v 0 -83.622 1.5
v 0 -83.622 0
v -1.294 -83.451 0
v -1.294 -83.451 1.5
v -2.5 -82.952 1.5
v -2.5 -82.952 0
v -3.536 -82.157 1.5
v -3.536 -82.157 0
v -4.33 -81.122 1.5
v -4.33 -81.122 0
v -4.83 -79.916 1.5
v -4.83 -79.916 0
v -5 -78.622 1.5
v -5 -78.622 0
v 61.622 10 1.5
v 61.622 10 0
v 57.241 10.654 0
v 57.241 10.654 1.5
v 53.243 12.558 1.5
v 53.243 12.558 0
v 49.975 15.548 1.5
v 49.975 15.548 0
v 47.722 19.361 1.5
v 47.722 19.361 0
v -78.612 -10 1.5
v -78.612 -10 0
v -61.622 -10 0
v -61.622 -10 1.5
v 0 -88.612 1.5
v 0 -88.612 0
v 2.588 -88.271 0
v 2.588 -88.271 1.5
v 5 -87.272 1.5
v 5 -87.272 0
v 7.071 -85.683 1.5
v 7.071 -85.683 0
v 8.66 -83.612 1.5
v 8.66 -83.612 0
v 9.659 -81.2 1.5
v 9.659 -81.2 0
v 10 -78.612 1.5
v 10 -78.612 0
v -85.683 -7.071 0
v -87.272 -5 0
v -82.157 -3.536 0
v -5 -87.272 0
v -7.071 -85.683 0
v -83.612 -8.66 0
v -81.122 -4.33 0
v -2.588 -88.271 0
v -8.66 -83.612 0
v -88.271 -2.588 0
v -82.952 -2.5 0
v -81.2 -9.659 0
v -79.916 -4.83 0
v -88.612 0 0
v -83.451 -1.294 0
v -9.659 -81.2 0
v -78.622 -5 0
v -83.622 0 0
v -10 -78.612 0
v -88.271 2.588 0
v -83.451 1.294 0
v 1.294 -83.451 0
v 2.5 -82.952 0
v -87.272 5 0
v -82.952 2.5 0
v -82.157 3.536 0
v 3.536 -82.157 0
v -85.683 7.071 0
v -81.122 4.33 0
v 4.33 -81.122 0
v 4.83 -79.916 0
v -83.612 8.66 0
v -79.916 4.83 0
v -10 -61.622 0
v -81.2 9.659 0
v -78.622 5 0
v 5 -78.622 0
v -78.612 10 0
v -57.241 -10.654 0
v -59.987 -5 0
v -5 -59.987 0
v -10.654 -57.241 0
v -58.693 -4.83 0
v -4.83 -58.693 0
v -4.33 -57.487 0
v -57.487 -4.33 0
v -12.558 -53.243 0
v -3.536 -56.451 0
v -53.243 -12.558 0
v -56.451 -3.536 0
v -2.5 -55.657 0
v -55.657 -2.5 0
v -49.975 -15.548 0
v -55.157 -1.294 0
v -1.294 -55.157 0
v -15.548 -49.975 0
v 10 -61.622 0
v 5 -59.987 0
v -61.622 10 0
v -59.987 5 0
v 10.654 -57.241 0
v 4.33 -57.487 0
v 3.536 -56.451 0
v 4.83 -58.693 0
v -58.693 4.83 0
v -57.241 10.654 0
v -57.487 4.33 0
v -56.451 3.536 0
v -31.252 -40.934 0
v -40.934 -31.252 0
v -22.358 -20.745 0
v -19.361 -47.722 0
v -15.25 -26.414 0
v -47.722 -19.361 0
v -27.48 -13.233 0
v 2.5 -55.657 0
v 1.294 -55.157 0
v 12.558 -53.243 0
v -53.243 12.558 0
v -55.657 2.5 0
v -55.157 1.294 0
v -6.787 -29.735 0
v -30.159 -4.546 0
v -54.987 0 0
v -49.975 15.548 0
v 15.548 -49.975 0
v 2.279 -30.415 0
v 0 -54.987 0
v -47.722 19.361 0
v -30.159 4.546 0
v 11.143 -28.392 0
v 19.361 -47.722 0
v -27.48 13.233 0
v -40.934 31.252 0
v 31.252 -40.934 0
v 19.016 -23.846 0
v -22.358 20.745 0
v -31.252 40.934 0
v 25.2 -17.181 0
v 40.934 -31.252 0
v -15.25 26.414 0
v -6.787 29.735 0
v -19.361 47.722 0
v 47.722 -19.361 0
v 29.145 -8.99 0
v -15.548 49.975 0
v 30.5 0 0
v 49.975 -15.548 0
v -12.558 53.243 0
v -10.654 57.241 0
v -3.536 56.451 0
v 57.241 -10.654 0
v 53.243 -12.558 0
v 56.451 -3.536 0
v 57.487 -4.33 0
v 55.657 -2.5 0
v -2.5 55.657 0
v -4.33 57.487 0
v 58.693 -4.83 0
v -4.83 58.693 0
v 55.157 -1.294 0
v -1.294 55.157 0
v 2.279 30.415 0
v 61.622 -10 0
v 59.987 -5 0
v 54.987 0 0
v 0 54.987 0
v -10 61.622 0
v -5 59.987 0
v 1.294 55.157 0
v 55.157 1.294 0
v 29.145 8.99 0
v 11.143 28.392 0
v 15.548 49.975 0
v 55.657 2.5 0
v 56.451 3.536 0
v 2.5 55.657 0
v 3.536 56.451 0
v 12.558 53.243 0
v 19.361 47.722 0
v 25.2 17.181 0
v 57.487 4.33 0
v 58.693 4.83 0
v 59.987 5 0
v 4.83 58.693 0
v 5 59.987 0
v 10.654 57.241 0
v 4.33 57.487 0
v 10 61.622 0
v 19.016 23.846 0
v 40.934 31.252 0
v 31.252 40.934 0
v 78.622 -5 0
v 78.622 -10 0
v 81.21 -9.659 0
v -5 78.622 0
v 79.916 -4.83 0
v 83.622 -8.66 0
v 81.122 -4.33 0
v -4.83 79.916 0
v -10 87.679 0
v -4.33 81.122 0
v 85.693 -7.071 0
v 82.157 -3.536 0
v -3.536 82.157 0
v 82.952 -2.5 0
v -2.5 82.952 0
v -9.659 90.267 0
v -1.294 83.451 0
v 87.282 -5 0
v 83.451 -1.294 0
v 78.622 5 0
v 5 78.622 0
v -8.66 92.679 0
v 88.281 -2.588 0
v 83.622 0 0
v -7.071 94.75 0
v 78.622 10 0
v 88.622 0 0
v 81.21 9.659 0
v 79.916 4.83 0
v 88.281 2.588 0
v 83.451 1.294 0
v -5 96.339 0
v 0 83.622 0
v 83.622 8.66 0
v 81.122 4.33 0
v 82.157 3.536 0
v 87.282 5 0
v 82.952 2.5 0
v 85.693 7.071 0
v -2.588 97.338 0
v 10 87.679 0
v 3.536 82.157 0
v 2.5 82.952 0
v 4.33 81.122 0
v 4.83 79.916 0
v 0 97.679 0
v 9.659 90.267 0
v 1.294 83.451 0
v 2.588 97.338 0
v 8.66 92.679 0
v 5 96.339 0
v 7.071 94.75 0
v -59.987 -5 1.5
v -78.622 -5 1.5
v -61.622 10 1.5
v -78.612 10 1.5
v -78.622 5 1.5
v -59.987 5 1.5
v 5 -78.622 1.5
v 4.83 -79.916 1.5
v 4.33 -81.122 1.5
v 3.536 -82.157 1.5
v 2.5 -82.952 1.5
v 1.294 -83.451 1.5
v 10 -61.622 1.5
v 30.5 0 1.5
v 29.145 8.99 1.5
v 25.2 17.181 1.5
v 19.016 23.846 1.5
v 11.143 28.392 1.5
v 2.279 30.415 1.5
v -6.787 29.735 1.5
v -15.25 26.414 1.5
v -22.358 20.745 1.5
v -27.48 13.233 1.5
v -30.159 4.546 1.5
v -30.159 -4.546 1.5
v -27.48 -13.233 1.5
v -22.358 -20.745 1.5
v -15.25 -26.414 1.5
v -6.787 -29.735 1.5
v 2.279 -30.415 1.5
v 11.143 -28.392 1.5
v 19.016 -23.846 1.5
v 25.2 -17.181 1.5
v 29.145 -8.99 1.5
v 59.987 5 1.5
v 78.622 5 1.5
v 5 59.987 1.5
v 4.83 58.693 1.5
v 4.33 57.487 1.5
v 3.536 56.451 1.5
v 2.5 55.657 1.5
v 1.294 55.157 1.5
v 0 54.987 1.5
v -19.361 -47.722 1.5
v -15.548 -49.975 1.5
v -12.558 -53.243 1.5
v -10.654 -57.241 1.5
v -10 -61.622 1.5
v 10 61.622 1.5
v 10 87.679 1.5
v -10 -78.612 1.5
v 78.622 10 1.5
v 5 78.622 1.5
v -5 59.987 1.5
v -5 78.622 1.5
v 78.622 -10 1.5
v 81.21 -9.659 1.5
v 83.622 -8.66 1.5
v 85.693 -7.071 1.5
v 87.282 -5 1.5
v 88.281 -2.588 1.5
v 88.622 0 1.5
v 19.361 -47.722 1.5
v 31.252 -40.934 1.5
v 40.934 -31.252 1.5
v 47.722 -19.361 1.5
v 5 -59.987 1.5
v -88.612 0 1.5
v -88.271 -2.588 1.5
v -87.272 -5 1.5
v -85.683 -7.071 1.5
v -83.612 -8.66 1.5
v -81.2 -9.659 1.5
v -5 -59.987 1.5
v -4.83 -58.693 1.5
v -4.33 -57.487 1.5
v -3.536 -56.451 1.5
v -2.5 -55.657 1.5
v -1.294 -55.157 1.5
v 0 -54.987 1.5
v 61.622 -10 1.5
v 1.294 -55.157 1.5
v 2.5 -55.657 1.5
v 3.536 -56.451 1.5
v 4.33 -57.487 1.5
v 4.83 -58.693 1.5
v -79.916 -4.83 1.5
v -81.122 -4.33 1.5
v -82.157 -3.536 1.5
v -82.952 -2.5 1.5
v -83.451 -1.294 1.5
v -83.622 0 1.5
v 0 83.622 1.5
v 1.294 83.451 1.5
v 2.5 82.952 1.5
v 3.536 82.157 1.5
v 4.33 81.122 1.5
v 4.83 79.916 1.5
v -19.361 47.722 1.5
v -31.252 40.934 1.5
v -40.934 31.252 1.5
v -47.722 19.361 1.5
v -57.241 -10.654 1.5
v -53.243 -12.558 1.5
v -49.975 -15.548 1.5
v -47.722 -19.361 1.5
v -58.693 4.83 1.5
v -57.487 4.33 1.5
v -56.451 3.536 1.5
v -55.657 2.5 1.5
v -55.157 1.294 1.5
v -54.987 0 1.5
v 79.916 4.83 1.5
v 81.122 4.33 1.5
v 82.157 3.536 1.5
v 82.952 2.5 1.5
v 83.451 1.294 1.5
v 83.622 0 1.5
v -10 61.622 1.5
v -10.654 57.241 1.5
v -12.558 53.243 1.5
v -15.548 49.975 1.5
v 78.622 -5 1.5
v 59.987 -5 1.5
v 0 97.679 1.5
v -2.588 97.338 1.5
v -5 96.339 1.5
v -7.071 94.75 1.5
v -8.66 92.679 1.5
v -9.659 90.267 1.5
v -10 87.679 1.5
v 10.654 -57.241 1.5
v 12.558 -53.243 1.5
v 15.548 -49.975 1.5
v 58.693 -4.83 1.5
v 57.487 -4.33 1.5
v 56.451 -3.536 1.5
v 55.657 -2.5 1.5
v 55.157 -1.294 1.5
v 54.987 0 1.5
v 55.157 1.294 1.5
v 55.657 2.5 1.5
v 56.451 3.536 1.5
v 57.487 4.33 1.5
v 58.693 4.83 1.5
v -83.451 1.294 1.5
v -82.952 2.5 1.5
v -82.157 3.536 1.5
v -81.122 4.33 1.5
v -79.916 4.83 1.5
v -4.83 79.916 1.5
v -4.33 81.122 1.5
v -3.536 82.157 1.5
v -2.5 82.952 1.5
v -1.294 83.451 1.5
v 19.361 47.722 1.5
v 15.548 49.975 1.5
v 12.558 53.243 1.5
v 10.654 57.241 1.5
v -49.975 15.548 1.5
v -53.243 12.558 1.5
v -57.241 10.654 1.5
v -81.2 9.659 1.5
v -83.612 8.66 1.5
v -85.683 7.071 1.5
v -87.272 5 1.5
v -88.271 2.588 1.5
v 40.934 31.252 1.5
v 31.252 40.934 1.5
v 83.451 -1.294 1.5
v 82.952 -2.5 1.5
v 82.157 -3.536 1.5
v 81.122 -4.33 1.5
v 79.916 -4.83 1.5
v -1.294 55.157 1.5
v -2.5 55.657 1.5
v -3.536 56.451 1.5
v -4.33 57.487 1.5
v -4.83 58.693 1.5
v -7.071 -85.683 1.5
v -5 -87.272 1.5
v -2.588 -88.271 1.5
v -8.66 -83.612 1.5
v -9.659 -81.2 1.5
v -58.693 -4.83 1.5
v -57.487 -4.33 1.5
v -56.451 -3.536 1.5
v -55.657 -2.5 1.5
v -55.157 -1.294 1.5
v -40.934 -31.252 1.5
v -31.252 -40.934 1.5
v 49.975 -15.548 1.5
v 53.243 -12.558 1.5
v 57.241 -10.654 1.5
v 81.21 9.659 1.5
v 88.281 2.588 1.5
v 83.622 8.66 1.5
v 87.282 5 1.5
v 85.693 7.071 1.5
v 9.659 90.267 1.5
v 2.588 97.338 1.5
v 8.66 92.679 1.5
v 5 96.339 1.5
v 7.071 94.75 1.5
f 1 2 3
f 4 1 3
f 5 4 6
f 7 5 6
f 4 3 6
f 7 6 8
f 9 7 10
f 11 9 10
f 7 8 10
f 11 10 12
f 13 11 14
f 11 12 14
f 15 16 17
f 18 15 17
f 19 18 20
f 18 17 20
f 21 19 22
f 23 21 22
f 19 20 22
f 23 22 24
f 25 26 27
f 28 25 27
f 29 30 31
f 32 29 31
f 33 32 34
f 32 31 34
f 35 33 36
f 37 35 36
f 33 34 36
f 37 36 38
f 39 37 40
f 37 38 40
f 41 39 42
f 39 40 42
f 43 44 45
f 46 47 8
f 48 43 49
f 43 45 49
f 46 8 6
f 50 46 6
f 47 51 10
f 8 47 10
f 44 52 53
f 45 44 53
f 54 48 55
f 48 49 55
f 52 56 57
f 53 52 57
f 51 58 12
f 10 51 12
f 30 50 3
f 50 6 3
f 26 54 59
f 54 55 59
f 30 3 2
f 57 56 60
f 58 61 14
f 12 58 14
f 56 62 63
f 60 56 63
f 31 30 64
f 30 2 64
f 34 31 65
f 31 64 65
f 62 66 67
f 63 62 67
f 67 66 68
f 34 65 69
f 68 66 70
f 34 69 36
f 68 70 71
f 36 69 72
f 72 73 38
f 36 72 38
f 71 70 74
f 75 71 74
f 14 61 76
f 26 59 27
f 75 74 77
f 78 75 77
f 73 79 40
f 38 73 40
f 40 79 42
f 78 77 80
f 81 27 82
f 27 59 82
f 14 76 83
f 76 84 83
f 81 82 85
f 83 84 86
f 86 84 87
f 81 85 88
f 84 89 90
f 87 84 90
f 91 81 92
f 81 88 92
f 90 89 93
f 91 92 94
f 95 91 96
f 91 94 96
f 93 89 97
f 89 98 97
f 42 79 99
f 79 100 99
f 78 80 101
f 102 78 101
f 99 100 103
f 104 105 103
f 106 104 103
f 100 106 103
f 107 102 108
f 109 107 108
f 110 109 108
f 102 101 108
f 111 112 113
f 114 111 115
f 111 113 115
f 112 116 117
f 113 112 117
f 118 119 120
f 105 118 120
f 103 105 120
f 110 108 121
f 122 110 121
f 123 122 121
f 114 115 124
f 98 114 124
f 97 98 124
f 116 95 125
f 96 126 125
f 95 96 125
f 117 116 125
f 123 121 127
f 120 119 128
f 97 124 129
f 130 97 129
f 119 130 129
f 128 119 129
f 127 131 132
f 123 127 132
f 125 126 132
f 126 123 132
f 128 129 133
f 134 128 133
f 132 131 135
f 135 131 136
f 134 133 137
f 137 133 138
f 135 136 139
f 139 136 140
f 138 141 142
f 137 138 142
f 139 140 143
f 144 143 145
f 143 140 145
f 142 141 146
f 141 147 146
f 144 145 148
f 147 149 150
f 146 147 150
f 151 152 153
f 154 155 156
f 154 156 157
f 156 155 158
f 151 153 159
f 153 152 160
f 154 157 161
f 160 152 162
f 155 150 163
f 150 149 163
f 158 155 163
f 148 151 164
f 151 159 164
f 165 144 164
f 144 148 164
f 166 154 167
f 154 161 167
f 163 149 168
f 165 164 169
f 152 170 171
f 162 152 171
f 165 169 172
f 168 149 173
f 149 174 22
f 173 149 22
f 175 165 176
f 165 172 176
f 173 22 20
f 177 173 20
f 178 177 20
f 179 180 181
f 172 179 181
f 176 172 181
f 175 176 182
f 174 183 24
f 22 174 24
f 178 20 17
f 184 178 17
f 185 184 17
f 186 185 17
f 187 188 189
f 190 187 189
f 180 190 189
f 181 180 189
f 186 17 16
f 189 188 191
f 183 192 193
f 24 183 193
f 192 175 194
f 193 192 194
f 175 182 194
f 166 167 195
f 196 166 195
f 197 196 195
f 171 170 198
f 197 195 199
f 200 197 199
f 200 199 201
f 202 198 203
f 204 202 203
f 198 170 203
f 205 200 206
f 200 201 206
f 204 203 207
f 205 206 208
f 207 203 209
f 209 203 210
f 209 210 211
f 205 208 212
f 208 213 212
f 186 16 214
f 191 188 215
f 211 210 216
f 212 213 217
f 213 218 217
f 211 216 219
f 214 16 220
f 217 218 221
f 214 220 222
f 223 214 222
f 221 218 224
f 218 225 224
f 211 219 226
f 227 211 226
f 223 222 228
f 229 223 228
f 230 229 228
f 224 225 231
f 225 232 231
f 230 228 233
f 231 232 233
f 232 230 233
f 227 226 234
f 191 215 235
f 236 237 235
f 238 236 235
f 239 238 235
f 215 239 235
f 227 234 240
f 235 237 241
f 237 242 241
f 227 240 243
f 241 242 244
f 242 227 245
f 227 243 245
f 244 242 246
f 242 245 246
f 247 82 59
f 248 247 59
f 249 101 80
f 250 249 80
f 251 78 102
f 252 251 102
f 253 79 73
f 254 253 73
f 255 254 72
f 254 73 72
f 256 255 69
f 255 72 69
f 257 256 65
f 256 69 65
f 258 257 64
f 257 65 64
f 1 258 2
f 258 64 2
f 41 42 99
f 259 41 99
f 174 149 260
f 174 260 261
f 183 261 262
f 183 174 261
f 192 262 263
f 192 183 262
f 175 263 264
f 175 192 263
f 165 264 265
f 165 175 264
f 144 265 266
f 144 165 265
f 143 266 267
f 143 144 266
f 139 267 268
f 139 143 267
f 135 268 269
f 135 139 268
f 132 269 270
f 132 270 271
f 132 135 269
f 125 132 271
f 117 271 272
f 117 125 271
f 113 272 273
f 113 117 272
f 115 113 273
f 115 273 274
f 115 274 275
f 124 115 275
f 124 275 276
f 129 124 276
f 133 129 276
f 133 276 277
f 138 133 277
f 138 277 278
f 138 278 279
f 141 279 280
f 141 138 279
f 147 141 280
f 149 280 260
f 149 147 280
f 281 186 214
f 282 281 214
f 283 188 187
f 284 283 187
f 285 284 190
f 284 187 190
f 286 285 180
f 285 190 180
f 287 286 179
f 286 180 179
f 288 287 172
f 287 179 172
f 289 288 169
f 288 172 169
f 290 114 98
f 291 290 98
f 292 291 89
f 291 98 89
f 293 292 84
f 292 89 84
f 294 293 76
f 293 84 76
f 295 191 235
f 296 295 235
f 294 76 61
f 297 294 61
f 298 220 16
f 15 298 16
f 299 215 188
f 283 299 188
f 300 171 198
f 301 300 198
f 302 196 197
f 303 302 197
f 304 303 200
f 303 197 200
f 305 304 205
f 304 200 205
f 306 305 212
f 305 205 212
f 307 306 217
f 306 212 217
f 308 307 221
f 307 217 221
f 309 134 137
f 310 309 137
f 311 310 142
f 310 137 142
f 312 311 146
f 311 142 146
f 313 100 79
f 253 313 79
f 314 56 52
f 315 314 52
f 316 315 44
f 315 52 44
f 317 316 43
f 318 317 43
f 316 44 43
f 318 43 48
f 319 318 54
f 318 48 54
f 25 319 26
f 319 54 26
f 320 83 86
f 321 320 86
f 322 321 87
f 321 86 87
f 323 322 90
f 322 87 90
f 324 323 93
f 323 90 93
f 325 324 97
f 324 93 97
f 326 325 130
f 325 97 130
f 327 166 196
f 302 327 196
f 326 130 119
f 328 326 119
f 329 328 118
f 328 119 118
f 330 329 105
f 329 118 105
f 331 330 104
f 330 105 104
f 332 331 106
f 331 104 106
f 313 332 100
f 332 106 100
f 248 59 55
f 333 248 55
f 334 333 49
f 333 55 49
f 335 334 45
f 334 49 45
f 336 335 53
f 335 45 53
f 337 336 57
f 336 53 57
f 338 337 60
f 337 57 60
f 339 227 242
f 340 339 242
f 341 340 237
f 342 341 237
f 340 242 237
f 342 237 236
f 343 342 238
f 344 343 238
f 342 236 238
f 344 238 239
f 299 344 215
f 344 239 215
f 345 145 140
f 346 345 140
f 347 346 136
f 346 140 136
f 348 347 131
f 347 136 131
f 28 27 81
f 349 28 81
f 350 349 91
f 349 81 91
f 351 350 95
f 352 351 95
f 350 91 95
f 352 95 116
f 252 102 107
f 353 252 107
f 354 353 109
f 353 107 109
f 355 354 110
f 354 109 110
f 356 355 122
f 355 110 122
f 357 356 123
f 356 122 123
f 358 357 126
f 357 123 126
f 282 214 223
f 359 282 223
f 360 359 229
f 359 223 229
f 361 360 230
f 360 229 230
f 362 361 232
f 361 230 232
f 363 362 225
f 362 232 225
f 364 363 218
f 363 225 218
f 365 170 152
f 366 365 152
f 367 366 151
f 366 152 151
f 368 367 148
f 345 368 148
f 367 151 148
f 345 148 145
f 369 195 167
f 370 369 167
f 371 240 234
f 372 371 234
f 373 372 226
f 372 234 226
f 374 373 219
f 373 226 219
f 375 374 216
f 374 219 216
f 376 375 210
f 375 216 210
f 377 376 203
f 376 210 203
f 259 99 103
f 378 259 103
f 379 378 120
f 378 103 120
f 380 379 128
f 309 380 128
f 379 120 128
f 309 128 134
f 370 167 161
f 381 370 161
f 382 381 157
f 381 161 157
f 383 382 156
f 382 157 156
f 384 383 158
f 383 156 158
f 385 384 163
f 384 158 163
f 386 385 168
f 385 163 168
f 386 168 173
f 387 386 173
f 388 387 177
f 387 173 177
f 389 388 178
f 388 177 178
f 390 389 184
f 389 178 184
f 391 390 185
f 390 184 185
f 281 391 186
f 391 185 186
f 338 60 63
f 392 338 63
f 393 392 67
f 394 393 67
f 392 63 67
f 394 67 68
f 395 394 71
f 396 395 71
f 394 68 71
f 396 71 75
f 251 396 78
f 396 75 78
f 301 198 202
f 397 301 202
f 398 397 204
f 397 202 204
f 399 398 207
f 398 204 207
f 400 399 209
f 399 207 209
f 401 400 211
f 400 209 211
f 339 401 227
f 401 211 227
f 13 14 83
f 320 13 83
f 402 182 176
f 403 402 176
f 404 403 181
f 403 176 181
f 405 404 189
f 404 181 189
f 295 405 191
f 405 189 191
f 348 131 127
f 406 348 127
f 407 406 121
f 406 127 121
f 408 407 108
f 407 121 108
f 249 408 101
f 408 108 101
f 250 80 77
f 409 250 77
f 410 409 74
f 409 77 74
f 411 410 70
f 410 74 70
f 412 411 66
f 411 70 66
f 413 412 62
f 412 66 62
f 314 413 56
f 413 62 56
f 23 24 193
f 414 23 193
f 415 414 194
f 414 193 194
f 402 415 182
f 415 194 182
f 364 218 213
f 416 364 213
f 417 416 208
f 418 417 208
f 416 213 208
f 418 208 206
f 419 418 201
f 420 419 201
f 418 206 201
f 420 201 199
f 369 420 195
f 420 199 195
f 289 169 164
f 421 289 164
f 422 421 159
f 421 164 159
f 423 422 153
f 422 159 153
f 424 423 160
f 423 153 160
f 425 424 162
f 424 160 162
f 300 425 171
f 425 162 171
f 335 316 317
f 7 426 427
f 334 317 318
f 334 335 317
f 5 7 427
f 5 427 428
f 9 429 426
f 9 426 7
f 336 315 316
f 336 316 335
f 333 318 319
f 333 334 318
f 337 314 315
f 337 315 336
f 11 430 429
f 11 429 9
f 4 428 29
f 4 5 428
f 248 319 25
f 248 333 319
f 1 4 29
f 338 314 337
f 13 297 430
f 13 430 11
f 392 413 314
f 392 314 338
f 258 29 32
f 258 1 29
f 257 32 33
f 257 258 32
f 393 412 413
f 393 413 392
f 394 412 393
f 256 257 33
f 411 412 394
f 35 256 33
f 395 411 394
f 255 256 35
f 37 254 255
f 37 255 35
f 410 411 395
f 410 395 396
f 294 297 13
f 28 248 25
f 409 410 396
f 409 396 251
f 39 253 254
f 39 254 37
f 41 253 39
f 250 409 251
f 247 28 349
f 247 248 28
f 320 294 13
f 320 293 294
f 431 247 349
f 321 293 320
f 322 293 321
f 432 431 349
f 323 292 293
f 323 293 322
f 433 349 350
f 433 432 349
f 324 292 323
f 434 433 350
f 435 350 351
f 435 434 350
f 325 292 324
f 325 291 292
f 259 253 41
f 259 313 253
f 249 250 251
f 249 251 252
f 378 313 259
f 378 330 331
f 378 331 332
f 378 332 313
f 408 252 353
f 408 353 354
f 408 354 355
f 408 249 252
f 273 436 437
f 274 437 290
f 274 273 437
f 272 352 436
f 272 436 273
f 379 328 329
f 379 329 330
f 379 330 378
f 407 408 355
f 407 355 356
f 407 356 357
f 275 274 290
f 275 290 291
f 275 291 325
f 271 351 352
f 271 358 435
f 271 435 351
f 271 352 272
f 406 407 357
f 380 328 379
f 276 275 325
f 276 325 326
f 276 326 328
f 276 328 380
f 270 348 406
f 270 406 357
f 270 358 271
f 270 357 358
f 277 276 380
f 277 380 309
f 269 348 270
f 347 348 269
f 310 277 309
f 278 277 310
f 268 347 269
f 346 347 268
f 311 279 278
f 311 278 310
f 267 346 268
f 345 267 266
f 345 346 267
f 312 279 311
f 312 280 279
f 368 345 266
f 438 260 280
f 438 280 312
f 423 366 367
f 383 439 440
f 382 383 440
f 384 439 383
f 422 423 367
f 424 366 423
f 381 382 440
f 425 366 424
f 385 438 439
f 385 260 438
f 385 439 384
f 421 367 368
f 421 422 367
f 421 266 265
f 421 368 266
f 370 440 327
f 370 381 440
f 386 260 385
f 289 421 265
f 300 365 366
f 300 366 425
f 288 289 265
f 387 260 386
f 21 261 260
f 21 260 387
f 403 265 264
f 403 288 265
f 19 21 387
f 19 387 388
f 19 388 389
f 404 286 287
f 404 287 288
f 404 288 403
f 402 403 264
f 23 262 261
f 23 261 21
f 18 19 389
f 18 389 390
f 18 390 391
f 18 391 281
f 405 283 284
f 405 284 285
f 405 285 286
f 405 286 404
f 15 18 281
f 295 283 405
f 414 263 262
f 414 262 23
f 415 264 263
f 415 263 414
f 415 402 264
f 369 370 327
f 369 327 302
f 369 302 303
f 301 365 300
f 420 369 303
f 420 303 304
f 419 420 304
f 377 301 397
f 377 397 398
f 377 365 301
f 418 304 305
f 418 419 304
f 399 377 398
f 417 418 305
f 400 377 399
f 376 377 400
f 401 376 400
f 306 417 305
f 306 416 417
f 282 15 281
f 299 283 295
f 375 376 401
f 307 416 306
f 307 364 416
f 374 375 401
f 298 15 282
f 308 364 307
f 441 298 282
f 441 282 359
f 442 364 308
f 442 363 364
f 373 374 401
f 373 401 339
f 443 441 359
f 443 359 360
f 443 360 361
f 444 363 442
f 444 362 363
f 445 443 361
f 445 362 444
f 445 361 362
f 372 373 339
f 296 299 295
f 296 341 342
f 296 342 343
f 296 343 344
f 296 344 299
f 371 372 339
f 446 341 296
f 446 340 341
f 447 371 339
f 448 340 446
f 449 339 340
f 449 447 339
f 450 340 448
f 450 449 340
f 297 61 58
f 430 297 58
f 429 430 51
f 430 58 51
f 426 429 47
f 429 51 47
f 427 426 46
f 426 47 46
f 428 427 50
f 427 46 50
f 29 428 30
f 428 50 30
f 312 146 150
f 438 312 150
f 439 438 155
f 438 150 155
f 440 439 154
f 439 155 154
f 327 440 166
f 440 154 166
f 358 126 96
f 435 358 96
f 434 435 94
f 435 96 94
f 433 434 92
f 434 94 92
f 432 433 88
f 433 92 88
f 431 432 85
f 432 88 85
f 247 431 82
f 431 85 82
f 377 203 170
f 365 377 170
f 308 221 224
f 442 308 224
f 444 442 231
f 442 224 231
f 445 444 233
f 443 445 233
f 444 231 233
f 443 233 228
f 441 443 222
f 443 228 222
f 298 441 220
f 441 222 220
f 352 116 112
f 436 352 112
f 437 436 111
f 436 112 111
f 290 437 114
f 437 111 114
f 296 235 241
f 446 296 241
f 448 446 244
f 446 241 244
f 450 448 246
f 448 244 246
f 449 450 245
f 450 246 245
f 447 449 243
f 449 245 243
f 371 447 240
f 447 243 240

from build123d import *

# Parameters (mm, degrees)
F0_R     = 30.5
F0_W     = 5
F0_H     = 10.5
F0_W_2   = 10.5
F0_H_2   = 5
F1_DEPTH = 1.5


# Not quite as in the source:
# - a feature names something its author has since deleted; it is built from what else it names


with BuildPart() as f1:
    # F0 (on Top) → F1 (new body)
    with BuildSketch(Plane.XY):
        with BuildLine():
            ThreePointArc((-10, 61.6218305473), (-12.5584071324, 53.2428827066), (-19.3609022556, 47.7221695216))
            ThreePointArc((-19.3609022556, 47.7221695216), (-36.4159992311, 36.4159992311), (-47.7221695216, 19.3609022556))
            ThreePointArc((-47.7221695216, 19.3609022556), (-53.2428827066, 12.5584071324), (-61.6218305473, 10))
            Line((-61.6218305473, 10), (-65.6218305473, 10))
            Line((-65.6218305473, 10), (-65.6218305473, 5))
            Line((-65.6218305473, 5), (-59.986856736, 5))
            ThreePointArc((-59.986856736, 5), (-56.45132283, 3.5355339059), (-54.986856736, 0))
            ThreePointArc((-54.986856736, 0), (-56.45132283, -3.5355339059), (-59.986856736, -5))
            Line((-59.986856736, -5), (-65.6218305473, -5))
            Line((-65.6218305473, -5), (-65.6218305473, -10))
            Line((-65.6218305473, -10), (-61.6218305473, -10))
            ThreePointArc((-61.6218305473, -10), (-53.2428827066, -12.5584071324), (-47.7221695216, -19.3609022556))
            ThreePointArc((-47.7221695216, -19.3609022556), (-36.4159992311, -36.4159992311), (-19.3609022556, -47.7221695216))
            ThreePointArc((-19.3609022556, -47.7221695216), (-12.5584071324, -53.2428827066), (-10, -61.6218305473))
            Line((-10, -61.6218305473), (-10, -65.6218305473))
            Line((-10, -65.6218305473), (-5, -65.6218305473))
            Line((-5, -65.6218305473), (-5, -59.986856736))
            ThreePointArc((-5, -59.986856736), (-3.5355339059, -56.45132283), (0, -54.986856736))
            ThreePointArc((0, -54.986856736), (3.5355339059, -56.45132283), (5, -59.986856736))
            Line((5, -59.986856736), (5, -65.6218305473))
            Line((5, -65.6218305473), (10, -65.6218305473))
            Line((10, -65.6218305473), (10, -61.6218305473))
            ThreePointArc((10, -61.6218305473), (12.5584071324, -53.2428827066), (19.3609022556, -47.7221695216))
            ThreePointArc((19.3609022556, -47.7221695216), (36.4159992311, -36.4159992311), (47.7221695216, -19.3609022556))
            ThreePointArc((47.7221695216, -19.3609022556), (53.2428827066, -12.5584071324), (61.6218305473, -10))
            Line((61.6218305473, -10), (65.6218305473, -10))
            Line((65.6218305473, -10), (65.6218305473, -5))
            Line((65.6218305473, -5), (59.986856736, -5))
            ThreePointArc((59.986856736, -5), (56.45132283, -3.5355339059), (54.986856736, 0))
            ThreePointArc((54.986856736, 0), (56.45132283, 3.5355339059), (59.986856736, 5))
            Line((59.986856736, 5), (65.6218305473, 5))
            Line((65.6218305473, 5), (65.6218305473, 10))
            Line((65.6218305473, 10), (61.6218305473, 10))
            ThreePointArc((61.6218305473, 10), (53.2428827066, 12.5584071324), (47.7221695216, 19.3609022556))
            ThreePointArc((47.7221695216, 19.3609022556), (36.4159992311, 36.4159992311), (19.3609022556, 47.7221695216))
            ThreePointArc((19.3609022556, 47.7221695216), (12.5584071324, 53.2428827066), (10, 61.6218305473))
            Line((10, 61.6218305473), (10, 65.6218305473))
            Line((10, 65.6218305473), (5, 65.6218305473))
            Line((5, 65.6218305473), (5, 59.986856736))
            ThreePointArc((5, 59.986856736), (3.5355339059, 56.45132283), (0, 54.986856736))
            ThreePointArc((0, 54.986856736), (-3.5355339059, 56.45132283), (-5, 59.986856736))
            Line((-5, 59.986856736), (-5, 65.6218305473))
            Line((-5, 65.6218305473), (-10, 65.6218305473))
            Line((-10, 65.6218305473), (-10, 61.6218305473))
        make_face()
        Circle(F0_R, mode=Mode.SUBTRACT)
        with Locations((7.5, 70.8718305473)):
            Rectangle(F0_W, F0_H)
        with Locations((-7.5, 70.8718305473)):
            Rectangle(F0_W, F0_H)
        with Locations((70.8718305473, 7.5)):
            Rectangle(F0_W_2, F0_H_2)
        with Locations((70.8718305473, -7.5)):
            Rectangle(F0_W_2, F0_H_2)
        with BuildLine():
            Line((78.6218305473, 10), (76.1218305473, 10))
            Line((76.1218305473, 10), (76.1218305473, 5))
            Line((76.1218305473, 5), (78.6218305473, 5))
            ThreePointArc((78.6218305473, 5), (82.1573644532, 3.5355339059), (83.6218305473, 0))
            ThreePointArc((83.6218305473, 0), (82.1573644532, -3.5355339059), (78.6218305473, -5))
            Line((78.6218305473, -5), (76.1218305473, -5))
            Line((76.1218305473, -5), (76.1218305473, -10))
            Line((76.1218305473, -10), (78.6218305473, -10))
            ThreePointArc((78.6218305473, -10), (85.6928983592, -7.0710678119), (88.6218305473, 0))
            ThreePointArc((88.6218305473, 0), (85.6928983592, 7.0710678119), (78.6218305473, 10))
        make_face()
        with Locations((-70.8718305473, -7.5)):
            Rectangle(F0_W_2, F0_H_2)
        with Locations((-70.8718305473, 7.5)):
            Rectangle(F0_W_2, F0_H_2)
        with BuildLine():
            Line((-76.1218305473, 5), (-76.1218305473, 10))
            Line((-76.1218305473, 10), (-78.611907205, 10))
            ThreePointArc((-78.611907205, 10), (-85.6829750169, 7.0710678119), (-88.611907205, 0))
            ThreePointArc((-88.611907205, 0), (-85.6829750169, -7.0710678119), (-78.611907205, -10))
            Line((-78.611907205, -10), (-76.1218305473, -10))
            Line((-76.1218305473, -10), (-76.1218305473, -5))
            Line((-76.1218305473, -5), (-78.6218305473, -5))
            ThreePointArc((-78.6218305473, -5), (-82.1573644532, -3.5355339059), (-83.6218305473, 0))
            ThreePointArc((-83.6218305473, 0), (-82.1573644532, 3.5355339059), (-78.6218305473, 5))
            Line((-78.6218305473, 5), (-76.1218305473, 5))
        make_face()
        with Locations((-7.5, -70.8718305473)):
            Rectangle(F0_W, F0_H)
        with Locations((7.5, -70.8718305473)):
            Rectangle(F0_W, F0_H)
        with BuildLine():
            Line((-5, -76.1218305473), (-10, -76.1218305473))
            Line((-10, -76.1218305473), (-10, -78.611907205))
            ThreePointArc((-10, -78.611907205), (-7.0710678119, -85.6829750169), (0, -88.611907205))
            ThreePointArc((0, -88.611907205), (7.0710678119, -85.6829750169), (10, -78.611907205))
            Line((10, -78.611907205), (10, -76.1218305473))
            Line((10, -76.1218305473), (5, -76.1218305473))
            Line((5, -76.1218305473), (5, -78.6218305473))
            ThreePointArc((5, -78.6218305473), (3.5355339059, -82.1573644532), (0, -83.6218305473))
            ThreePointArc((0, -83.6218305473), (-3.5355339059, -82.1573644532), (-5, -78.6218305473))
            Line((-5, -78.6218305473), (-5, -76.1218305473))
        make_face()
        with BuildLine():
            Line((-10, 87.6788190633), (-10, 76.1218305473))
            Line((-10, 76.1218305473), (-5, 76.1218305473))
            Line((-5, 76.1218305473), (-5, 78.6218305473))
            ThreePointArc((-5, 78.6218305473), (-3.5355339059, 82.1573644532), (0, 83.6218305473))
            ThreePointArc((0, 83.6218305473), (3.5355339059, 82.1573644532), (5, 78.6218305473))
            Line((5, 78.6218305473), (5, 76.1218305473))
            Line((5, 76.1218305473), (10, 76.1218305473))
            Line((10, 76.1218305473), (10, 87.6788190633))
            ThreePointArc((10, 87.6788190633), (7.0710678119, 94.7498868751), (0, 97.6788190633))
            ThreePointArc((0, 97.6788190633), (-7.0710678119, 94.7498868751), (-10, 87.6788190633))
        make_face()
    extrude(amount=F1_DEPTH)


solid = f1.part
